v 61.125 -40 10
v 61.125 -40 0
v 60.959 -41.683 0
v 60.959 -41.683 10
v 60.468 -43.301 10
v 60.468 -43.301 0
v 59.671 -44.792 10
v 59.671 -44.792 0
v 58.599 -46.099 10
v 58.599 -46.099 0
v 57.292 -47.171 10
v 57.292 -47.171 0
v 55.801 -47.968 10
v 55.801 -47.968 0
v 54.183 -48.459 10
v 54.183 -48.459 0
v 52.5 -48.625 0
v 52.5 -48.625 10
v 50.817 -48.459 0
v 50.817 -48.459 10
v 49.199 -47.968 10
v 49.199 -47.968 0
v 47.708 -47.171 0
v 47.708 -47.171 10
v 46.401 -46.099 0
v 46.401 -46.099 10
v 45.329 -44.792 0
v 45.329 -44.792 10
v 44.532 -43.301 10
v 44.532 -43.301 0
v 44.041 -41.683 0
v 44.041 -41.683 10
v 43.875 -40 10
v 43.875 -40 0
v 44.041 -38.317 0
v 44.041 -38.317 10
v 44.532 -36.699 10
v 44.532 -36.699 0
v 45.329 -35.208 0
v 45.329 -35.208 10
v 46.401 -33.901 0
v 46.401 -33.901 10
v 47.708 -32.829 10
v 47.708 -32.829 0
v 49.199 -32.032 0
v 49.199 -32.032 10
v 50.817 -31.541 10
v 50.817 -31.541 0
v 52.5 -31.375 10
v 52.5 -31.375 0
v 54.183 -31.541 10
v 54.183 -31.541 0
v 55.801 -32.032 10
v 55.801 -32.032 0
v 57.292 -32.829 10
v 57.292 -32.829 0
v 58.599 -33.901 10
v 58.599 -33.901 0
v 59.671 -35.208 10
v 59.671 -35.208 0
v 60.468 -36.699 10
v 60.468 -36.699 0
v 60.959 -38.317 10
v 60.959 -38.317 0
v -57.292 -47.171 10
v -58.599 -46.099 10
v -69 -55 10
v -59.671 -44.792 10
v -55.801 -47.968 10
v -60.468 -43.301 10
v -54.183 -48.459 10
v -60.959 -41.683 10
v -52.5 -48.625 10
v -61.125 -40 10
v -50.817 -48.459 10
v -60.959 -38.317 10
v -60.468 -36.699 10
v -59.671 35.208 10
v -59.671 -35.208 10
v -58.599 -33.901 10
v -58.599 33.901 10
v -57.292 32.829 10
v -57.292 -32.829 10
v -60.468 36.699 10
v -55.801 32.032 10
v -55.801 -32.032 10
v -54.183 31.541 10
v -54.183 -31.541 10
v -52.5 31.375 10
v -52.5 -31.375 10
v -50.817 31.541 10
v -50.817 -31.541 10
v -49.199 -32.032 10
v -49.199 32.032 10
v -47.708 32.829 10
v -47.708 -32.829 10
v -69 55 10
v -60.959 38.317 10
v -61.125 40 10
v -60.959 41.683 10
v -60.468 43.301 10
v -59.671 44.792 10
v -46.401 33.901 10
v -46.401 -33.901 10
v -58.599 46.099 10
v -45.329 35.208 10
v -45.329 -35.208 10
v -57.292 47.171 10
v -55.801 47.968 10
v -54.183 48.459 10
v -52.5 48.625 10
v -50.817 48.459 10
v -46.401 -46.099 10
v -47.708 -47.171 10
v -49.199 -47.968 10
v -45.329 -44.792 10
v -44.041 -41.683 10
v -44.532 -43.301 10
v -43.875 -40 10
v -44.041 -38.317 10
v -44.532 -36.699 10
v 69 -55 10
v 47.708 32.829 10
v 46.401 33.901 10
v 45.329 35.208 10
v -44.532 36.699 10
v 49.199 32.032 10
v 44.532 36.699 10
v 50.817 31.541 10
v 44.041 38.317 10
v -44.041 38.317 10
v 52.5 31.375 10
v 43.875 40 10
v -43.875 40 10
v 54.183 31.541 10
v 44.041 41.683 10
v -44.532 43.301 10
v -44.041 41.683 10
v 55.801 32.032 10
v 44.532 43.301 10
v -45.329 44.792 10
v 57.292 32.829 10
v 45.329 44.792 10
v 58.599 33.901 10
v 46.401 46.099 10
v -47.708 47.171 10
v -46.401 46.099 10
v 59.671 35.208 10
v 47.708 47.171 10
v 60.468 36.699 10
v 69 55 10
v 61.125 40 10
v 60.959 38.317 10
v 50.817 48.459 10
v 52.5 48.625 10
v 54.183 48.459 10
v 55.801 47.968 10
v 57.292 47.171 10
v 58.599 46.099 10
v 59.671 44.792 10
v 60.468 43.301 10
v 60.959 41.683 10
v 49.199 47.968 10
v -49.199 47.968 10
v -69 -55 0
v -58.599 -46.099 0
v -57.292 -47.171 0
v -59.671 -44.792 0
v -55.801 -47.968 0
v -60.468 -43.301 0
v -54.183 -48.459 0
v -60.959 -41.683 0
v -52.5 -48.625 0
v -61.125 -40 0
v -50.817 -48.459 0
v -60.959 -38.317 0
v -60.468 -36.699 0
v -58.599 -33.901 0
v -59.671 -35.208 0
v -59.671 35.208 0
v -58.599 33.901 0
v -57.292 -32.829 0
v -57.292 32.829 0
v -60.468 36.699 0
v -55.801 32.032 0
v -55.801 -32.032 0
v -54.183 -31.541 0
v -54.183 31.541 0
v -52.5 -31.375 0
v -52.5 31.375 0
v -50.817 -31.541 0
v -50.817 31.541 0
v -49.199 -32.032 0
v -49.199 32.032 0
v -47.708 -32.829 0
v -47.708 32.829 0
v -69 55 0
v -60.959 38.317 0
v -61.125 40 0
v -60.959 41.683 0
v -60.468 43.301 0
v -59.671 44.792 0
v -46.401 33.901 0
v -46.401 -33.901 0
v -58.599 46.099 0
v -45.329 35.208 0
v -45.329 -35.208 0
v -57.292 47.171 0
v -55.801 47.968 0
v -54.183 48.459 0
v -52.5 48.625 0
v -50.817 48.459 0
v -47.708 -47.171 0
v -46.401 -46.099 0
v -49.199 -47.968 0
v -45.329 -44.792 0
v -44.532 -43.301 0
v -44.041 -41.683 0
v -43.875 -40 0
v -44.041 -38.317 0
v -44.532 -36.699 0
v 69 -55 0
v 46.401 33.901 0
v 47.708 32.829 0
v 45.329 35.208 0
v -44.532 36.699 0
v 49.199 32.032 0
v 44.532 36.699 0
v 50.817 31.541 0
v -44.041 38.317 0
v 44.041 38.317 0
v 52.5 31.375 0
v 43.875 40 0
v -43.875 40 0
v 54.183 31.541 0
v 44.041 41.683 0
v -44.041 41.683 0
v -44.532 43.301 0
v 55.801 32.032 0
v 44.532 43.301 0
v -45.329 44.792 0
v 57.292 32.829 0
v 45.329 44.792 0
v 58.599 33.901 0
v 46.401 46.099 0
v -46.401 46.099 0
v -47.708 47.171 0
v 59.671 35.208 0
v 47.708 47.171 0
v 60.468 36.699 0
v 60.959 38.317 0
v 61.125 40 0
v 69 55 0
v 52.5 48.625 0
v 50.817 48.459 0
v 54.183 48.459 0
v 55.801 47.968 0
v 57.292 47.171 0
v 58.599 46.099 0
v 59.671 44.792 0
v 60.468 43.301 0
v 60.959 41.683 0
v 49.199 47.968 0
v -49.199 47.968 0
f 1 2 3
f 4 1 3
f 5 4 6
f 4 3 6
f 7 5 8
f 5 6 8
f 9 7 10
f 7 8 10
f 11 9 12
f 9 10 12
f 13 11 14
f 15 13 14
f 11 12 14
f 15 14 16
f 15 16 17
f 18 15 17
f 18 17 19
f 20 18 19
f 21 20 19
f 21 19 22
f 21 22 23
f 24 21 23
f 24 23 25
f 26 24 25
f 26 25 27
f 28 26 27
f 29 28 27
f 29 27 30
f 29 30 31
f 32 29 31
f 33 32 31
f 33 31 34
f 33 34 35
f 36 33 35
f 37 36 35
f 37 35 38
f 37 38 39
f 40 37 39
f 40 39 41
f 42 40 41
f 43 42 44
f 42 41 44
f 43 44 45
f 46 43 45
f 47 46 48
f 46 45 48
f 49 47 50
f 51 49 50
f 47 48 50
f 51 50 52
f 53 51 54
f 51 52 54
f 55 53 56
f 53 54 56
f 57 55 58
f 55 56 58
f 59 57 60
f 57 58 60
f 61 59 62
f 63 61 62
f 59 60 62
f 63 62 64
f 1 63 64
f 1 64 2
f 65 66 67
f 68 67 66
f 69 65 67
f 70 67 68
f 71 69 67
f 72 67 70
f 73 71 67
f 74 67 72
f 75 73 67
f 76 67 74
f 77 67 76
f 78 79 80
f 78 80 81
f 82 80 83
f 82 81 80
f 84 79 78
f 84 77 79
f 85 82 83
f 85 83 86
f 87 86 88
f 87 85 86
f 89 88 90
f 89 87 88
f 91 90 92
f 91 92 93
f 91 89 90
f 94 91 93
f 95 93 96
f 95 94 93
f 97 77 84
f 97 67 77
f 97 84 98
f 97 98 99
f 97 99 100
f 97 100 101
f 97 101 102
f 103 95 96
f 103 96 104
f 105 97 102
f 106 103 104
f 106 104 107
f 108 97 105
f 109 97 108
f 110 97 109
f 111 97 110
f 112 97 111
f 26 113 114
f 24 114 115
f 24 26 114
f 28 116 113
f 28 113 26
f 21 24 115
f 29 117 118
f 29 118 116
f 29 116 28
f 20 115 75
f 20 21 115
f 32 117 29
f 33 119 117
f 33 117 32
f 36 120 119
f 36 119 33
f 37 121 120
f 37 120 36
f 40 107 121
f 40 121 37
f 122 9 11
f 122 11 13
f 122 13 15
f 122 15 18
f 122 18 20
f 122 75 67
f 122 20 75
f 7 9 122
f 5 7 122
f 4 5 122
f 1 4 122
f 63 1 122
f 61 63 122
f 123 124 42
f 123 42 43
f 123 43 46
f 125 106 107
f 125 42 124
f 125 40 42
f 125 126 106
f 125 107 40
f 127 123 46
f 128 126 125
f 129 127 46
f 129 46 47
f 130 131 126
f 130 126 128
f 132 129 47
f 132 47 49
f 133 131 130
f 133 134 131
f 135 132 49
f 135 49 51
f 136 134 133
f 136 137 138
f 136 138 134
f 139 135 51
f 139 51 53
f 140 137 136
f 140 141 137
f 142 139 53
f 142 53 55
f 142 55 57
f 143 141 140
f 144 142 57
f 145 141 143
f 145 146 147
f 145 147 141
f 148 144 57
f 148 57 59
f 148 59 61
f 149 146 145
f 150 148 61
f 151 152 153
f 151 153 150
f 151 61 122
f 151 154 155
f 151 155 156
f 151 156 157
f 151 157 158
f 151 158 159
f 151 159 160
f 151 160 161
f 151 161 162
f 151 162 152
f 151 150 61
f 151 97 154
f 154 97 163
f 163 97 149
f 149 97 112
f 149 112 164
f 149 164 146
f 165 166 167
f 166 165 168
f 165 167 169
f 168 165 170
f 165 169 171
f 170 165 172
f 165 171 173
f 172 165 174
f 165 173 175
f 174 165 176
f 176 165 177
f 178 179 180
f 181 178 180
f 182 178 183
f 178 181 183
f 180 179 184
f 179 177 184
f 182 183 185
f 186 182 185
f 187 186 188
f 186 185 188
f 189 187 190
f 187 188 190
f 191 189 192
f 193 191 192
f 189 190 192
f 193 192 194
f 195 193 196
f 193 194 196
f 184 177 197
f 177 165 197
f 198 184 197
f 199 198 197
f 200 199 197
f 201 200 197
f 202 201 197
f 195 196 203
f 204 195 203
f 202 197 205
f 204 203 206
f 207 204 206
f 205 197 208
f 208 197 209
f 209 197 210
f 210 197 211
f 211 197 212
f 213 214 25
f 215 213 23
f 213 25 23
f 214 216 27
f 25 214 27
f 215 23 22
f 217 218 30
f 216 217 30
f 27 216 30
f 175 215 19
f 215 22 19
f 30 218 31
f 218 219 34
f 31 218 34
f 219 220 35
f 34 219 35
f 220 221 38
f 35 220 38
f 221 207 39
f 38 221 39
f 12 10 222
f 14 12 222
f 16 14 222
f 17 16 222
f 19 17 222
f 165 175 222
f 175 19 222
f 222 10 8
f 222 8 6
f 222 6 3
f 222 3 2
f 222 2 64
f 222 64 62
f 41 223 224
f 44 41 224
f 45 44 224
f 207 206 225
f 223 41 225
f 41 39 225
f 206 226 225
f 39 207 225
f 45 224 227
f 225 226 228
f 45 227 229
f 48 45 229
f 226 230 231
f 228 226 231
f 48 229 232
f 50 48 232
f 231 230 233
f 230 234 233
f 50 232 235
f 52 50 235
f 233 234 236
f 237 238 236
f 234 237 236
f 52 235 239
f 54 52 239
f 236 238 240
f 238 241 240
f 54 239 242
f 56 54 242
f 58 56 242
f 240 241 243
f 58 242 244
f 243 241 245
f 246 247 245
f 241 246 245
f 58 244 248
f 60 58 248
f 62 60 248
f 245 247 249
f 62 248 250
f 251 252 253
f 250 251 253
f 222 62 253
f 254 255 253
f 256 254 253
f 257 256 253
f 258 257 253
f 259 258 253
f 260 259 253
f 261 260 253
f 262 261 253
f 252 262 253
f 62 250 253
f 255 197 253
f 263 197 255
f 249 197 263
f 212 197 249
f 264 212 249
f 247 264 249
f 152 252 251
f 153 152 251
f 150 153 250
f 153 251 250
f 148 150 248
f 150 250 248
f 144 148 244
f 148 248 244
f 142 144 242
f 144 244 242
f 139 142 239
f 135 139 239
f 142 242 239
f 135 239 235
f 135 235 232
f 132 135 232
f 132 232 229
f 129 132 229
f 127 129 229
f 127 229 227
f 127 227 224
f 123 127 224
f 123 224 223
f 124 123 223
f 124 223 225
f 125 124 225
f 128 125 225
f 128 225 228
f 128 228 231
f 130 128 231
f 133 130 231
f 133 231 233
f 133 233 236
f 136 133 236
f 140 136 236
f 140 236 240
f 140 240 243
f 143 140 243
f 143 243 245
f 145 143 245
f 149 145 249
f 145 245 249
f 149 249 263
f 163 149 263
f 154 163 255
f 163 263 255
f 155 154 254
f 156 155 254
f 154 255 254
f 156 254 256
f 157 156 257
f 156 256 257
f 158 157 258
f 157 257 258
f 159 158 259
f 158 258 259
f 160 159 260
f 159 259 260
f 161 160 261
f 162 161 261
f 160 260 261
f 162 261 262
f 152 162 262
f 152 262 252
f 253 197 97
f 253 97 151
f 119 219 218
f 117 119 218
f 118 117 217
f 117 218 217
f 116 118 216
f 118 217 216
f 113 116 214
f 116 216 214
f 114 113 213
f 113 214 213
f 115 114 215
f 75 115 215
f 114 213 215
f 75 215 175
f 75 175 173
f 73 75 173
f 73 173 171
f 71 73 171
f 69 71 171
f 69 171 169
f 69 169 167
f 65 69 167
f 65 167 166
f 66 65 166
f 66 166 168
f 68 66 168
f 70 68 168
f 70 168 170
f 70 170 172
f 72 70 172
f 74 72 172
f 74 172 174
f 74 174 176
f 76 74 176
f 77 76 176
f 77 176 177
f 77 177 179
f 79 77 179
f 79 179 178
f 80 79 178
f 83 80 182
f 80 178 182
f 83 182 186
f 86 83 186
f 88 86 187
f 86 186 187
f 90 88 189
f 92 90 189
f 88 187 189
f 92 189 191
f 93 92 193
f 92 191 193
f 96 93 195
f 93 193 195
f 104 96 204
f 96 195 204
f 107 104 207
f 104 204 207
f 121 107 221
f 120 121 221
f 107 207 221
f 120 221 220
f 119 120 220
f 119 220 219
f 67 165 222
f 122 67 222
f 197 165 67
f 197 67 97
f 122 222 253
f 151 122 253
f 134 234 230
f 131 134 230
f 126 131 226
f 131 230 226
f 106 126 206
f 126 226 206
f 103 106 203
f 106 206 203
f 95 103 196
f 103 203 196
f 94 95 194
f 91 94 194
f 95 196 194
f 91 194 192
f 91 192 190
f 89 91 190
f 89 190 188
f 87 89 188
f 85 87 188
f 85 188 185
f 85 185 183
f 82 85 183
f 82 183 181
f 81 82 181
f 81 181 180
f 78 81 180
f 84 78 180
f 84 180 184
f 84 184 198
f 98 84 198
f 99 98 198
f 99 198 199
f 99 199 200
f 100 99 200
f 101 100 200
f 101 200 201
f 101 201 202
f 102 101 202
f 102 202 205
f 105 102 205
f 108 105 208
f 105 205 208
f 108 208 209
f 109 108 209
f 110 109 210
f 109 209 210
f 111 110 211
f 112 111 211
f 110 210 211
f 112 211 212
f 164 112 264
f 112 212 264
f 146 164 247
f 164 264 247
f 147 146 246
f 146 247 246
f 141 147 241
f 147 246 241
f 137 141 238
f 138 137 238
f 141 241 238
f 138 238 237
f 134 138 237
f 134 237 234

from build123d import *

# Parameters (mm, degrees)
F0_W           = 138
F0_H           = 110
F0_R           = 5
F1_DEPTH       = 10
F2_D           = 11
F2_CBORE_D     = 17.25
F2_CBORE_DEPTH = 10


with BuildPart() as f1:
    # F0 (on Top) → F1 (new body)
    with BuildSketch(Plane.XY):
        Rectangle(F0_W, F0_H)
        with Locations((-52.5, -40)):
            Circle(F0_R, mode=Mode.SUBTRACT)
        with Locations((52.5, -40)):
            Circle(F0_R, mode=Mode.SUBTRACT)
        with Locations((-52.5, 40)):
            Circle(F0_R, mode=Mode.SUBTRACT)
        with Locations((52.5, 40)):
            Circle(F0_R, mode=Mode.SUBTRACT)
        with Locations((52.5, -40)):
            Circle(F0_R)
        with Locations((-52.5, 40)):
            Circle(F0_R)
        with Locations((-52.5, -40)):
            Circle(F0_R)
        with Locations((52.5, 40)):
            Circle(F0_R)
    extrude(amount=F1_DEPTH)

    # F2 (through all)
    with Locations(Plane(origin=(0, 0, 0), x_dir=(1, 0, 0), z_dir=(0, 0, -1))):
        with Locations((-52.5, -40), (52.5, -40), (-52.5, 40), (52.5, 40)):
            CounterBoreHole(F2_D / 2, F2_CBORE_D / 2, F2_CBORE_DEPTH)


solid = f1.part
